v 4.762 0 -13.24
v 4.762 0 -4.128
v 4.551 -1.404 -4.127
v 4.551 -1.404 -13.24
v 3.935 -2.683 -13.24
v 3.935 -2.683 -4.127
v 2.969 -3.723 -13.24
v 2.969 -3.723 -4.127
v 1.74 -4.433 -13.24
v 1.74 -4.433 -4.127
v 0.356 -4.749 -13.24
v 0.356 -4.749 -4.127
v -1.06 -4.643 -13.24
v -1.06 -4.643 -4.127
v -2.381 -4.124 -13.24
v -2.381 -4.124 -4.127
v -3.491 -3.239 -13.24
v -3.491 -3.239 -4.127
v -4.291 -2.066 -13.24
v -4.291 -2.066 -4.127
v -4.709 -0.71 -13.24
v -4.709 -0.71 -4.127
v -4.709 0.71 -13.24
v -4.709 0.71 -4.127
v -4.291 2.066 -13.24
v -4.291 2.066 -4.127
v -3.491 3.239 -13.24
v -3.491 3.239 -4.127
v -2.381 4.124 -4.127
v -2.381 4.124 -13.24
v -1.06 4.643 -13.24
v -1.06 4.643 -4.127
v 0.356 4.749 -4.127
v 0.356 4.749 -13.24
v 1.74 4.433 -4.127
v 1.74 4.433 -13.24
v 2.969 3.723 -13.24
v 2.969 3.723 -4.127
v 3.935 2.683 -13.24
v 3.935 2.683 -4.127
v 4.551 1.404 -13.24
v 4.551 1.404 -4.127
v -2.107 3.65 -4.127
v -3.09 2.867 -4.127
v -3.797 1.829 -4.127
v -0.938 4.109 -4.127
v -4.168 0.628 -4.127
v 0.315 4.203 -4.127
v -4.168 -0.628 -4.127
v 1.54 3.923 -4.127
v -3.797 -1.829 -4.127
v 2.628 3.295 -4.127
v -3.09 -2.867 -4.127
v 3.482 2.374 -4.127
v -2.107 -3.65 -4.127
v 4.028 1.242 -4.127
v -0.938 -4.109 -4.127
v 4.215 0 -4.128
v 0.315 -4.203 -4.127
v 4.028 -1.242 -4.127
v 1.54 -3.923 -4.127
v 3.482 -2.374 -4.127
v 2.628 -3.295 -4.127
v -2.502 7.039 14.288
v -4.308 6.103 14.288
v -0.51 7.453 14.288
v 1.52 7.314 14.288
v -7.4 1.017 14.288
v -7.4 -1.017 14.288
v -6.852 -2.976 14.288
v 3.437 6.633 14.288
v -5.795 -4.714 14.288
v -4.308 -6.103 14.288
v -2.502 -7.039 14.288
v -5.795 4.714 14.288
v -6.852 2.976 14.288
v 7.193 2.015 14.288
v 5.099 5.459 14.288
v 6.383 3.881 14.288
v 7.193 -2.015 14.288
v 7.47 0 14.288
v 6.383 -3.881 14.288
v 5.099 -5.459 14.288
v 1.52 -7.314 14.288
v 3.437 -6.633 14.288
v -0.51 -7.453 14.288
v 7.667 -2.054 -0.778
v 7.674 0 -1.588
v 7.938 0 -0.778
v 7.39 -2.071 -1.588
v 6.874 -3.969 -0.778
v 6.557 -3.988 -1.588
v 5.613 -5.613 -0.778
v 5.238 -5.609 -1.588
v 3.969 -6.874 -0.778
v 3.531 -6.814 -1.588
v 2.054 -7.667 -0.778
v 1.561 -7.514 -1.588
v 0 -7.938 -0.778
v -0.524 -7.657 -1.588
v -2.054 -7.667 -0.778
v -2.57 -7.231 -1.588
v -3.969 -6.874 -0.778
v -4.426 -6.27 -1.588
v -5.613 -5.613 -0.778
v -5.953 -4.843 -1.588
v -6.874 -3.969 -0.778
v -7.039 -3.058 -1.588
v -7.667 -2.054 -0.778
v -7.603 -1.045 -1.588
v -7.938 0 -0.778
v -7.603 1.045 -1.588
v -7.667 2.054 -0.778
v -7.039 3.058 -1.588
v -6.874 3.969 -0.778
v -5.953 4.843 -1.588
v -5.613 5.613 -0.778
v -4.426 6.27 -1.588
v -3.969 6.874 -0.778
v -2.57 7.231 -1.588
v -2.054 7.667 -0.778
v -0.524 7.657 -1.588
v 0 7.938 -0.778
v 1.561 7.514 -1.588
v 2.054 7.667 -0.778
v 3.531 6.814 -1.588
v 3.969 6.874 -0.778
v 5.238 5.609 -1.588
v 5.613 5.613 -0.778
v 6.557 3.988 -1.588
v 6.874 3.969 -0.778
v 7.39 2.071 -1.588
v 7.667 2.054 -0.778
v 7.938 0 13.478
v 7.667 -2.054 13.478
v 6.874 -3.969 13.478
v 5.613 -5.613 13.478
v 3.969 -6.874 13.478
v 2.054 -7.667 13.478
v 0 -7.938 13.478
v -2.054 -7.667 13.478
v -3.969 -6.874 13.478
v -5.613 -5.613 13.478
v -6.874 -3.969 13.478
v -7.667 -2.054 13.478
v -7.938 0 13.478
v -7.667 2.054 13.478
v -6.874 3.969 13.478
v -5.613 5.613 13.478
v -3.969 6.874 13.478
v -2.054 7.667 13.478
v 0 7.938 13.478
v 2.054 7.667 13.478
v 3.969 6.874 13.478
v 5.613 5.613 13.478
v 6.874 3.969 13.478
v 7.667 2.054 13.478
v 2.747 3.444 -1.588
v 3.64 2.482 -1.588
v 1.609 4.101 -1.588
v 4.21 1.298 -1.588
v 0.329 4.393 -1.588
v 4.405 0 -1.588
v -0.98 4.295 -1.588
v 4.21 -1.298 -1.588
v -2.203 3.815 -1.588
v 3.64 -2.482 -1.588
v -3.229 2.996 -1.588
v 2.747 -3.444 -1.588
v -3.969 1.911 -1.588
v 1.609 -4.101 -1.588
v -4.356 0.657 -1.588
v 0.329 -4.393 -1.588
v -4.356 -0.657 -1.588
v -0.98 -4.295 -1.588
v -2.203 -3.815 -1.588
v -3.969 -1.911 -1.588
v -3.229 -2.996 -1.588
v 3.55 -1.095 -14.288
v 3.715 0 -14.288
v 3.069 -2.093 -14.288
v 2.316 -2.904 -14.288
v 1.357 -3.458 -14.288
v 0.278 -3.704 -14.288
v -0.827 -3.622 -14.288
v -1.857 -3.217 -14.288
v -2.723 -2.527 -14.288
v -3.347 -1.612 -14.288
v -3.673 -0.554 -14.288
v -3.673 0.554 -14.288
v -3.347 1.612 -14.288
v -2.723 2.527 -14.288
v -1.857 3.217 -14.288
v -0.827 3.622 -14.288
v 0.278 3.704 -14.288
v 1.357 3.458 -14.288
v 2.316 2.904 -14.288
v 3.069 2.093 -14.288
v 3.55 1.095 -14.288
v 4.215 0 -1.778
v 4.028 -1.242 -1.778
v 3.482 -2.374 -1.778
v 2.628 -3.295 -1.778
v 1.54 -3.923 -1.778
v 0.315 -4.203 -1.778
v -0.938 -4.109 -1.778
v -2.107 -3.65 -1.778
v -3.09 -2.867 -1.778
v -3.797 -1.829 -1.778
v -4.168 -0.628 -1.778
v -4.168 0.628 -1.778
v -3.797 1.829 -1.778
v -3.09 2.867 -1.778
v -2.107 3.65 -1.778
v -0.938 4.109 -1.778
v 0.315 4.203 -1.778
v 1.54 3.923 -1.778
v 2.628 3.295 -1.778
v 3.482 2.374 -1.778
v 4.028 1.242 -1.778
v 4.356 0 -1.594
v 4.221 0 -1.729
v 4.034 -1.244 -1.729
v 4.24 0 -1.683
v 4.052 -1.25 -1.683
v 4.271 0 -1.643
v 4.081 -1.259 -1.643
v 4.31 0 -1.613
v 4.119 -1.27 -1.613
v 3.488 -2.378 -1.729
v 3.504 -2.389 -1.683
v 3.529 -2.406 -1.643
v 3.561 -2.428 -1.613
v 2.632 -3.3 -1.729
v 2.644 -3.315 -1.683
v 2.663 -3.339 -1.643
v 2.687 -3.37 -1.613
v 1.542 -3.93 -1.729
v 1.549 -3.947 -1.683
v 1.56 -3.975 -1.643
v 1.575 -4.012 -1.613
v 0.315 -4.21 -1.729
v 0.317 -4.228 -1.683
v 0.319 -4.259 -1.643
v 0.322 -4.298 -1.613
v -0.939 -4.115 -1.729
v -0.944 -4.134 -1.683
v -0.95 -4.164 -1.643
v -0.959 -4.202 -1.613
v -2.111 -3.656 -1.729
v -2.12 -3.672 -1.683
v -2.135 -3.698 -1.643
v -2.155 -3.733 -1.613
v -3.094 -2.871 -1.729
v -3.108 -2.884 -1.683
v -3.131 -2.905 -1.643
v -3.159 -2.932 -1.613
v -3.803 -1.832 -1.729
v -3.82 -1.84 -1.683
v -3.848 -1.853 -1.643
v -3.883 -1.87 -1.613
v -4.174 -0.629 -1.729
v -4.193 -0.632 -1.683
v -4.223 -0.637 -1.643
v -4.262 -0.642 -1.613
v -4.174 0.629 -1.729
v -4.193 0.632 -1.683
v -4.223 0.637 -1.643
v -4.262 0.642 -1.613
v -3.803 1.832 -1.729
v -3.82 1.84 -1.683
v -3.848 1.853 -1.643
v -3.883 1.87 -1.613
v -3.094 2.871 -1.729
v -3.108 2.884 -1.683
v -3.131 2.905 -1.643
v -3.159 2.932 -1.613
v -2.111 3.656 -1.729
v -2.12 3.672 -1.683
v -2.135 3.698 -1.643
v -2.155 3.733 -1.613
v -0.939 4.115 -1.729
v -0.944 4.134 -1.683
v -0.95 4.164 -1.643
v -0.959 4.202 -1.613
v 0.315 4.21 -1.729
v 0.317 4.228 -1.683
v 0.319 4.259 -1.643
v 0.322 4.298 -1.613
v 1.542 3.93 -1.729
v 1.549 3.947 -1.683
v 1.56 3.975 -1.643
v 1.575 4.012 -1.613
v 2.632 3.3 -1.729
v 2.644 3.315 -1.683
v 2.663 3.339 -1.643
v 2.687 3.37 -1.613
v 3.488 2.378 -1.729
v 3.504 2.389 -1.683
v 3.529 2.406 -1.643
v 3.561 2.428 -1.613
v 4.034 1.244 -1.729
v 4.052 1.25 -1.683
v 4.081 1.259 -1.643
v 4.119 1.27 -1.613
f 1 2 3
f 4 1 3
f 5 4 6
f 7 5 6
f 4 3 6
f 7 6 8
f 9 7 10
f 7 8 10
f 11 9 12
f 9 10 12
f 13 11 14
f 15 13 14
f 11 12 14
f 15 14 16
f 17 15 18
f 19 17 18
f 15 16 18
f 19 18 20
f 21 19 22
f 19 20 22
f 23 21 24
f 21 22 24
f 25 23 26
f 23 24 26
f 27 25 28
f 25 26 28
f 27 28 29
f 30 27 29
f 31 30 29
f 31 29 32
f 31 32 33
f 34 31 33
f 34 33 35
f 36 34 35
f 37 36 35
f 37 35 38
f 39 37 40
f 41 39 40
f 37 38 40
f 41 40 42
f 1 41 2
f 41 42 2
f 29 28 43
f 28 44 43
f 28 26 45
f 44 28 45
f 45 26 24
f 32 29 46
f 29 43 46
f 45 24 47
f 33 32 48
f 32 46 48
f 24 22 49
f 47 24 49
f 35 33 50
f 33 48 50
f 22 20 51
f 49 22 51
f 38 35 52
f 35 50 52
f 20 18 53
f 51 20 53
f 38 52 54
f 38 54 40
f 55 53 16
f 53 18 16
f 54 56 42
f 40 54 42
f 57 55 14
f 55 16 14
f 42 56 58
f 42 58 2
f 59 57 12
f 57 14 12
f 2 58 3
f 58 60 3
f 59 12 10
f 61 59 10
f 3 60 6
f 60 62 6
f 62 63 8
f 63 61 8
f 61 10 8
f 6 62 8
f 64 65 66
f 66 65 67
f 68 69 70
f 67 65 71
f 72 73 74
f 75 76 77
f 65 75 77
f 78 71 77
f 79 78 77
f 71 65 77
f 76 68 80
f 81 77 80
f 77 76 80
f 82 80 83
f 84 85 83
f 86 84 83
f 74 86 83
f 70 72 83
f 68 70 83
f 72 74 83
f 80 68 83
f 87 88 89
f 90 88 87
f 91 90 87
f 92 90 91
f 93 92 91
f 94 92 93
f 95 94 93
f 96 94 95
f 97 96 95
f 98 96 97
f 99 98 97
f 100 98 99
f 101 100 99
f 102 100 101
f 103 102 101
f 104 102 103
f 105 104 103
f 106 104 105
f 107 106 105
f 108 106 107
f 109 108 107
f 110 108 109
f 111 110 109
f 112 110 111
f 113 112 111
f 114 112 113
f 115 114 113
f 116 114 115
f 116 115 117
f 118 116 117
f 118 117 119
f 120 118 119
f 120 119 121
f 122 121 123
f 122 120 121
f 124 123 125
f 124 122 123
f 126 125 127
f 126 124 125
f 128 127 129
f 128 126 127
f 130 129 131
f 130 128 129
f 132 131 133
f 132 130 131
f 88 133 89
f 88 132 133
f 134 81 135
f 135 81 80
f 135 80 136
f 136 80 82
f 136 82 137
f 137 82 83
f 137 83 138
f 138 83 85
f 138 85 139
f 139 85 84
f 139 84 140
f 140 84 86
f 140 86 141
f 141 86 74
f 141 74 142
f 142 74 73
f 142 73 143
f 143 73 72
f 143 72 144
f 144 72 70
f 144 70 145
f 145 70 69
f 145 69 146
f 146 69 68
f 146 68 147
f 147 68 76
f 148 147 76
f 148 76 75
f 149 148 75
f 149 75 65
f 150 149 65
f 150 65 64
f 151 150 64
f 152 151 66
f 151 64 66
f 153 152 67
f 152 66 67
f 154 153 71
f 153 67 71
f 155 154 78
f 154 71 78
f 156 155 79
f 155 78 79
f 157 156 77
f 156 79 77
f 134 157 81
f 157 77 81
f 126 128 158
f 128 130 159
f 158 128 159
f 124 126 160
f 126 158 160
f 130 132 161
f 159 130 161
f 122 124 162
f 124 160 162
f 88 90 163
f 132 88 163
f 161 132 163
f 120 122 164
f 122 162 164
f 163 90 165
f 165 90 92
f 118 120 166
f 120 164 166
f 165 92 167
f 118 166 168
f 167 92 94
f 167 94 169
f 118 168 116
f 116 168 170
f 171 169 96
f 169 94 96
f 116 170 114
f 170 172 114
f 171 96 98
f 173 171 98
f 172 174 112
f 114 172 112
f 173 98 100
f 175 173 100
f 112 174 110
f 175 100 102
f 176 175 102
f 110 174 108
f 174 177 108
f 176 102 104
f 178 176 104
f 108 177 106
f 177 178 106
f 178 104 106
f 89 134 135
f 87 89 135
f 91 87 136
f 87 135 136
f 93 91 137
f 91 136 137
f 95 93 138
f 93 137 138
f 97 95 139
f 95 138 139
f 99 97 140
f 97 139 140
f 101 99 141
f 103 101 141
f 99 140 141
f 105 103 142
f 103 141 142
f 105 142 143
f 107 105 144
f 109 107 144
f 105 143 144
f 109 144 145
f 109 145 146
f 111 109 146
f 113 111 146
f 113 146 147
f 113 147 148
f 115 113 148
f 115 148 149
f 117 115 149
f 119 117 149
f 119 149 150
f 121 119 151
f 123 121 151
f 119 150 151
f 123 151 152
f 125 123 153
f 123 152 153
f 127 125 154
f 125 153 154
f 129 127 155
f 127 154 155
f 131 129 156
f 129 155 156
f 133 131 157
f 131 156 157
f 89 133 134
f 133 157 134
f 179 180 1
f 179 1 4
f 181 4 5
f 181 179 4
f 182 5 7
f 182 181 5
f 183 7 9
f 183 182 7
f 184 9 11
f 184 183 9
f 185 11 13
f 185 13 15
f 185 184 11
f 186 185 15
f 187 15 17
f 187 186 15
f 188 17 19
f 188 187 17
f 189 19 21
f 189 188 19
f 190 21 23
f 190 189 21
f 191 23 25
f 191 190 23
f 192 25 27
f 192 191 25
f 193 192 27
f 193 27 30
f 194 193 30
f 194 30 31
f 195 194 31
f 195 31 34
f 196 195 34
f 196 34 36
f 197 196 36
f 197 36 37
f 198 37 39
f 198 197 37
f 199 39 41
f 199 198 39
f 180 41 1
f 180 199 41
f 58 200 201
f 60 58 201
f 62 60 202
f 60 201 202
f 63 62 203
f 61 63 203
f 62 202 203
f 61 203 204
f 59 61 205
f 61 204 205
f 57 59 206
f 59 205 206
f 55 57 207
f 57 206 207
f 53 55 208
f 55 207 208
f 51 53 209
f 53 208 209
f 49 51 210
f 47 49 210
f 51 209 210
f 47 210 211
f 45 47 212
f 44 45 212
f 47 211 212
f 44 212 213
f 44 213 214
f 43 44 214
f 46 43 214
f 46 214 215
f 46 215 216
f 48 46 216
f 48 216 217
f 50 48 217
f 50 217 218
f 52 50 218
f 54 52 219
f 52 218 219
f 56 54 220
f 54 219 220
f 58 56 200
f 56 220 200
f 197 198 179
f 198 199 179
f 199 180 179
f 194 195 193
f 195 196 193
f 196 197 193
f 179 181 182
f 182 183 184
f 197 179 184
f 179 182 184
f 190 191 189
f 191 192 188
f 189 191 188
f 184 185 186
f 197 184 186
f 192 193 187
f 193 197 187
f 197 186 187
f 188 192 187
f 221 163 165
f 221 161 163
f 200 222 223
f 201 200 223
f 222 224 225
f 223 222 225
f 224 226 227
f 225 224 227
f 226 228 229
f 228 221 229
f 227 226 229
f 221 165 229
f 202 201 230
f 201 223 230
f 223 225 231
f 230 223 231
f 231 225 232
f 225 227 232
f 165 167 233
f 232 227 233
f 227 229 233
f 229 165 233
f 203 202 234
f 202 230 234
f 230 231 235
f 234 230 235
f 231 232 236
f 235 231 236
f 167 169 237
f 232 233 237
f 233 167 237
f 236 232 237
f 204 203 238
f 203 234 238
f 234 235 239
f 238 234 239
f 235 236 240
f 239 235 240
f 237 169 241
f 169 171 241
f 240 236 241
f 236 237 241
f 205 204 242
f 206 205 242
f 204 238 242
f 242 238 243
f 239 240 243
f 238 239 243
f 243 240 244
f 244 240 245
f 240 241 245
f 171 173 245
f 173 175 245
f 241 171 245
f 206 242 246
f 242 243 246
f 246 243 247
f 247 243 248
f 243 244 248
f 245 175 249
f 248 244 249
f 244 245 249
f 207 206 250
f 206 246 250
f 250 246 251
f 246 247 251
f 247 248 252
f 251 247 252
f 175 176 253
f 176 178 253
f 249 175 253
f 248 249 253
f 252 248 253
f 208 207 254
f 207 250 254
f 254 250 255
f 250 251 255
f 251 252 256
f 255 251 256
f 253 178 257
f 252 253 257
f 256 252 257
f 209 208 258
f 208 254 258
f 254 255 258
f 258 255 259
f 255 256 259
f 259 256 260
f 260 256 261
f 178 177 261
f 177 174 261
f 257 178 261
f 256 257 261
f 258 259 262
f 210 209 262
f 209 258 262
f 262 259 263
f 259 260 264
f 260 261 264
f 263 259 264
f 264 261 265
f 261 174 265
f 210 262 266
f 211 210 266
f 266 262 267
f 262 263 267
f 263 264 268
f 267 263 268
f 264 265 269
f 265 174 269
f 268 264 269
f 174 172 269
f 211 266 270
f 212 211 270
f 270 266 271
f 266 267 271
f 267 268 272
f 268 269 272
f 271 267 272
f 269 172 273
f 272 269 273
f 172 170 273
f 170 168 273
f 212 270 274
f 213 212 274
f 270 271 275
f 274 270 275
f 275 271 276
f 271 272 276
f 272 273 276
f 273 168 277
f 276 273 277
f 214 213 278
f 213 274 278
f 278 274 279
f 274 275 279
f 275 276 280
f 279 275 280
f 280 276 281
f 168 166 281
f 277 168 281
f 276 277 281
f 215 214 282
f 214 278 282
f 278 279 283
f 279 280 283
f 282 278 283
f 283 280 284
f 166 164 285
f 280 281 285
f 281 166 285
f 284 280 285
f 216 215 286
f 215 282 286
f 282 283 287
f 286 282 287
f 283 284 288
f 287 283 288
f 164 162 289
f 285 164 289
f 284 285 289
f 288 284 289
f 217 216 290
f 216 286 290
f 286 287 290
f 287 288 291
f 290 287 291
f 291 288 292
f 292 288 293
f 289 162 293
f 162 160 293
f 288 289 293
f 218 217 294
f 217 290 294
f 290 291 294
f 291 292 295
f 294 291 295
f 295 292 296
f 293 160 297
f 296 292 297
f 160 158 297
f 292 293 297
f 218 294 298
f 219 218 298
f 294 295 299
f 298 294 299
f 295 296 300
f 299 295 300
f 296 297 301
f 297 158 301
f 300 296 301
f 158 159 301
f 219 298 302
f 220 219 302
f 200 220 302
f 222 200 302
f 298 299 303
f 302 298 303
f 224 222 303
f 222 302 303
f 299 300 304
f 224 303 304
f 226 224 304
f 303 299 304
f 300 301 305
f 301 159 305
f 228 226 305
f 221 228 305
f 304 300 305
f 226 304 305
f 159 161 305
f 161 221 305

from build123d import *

# Parameters (mm, degrees)
CHAMFER1_SIZE  = 0.809625
CHAMFER1_SIZE2 = 0.467437212
CHAMFER2_SIZE  = 1.04775
FILLET1_R      = 0.1905
CHAMFER4_SIZE  = 0.809625
CHAMFER4_SIZE2 = 0.263063109


with BuildPart() as part:
    # Sketch2 → Revolve2 (revolve)
    with BuildSketch(Plane(origin=(0, 0, 0), x_dir=(0, 0, -1), z_dir=(1, 0, 0)), mode=Mode.PRIVATE) as revolve2_sk:
        Polygon((4.1275, 4.7625), (4.1275, 4.2148125), (3.5798125, 4.2148125), (1.5875, 4.2148125), (1.5875, 7.9375), (-14.2875, 7.9375), (-14.2875, 0), (14.2875, 0), (14.2875, 4.7625), align=None)
    revolve(revolve2_sk.sketch.rotate(Axis((0, 0, 14.2875), (0, 0, -1)), 90), axis=Axis((0, 0, 14.2875), (0, 0, -1)))

    # Chamfer1
    chamfer1_edges = [part.edges().sort_by_distance(p)[0] for p in [
        (-7.9375, 0, 14.2875),
    ]]
    chamfer1_side = [part.faces().sort_by_distance(p)[0] for p in [
        (-7.9375, 0, 6.35),
    ]]
    chamfer(chamfer1_edges, length=CHAMFER1_SIZE, length2=CHAMFER1_SIZE2, reference=chamfer1_side[0])

    # Chamfer2
    chamfer2_edges = [part.edges().sort_by_distance(p)[0] for p in [
        (-4.7625, 0, -14.2875),
    ]]
    chamfer(chamfer2_edges, length=CHAMFER2_SIZE)

    # Fillet1
    fillet1_edges = [part.edges().sort_by_distance(p)[0] for p in [
        (-4.2148125, 0, -1.5875),
    ]]
    fillet(fillet1_edges, radius=FILLET1_R)

    # Chamfer4
    chamfer4_edges = [part.edges().sort_by_distance(p)[0] for p in [
        (-7.9375, 0, -1.5875),
    ]]
    chamfer4_side = [part.faces().sort_by_distance(p)[0] for p in [
        (-7.9375, 0, 5.9451875),
    ]]
    chamfer(chamfer4_edges, length=CHAMFER4_SIZE, length2=CHAMFER4_SIZE2, reference=chamfer4_side[0])


solid = part.part
